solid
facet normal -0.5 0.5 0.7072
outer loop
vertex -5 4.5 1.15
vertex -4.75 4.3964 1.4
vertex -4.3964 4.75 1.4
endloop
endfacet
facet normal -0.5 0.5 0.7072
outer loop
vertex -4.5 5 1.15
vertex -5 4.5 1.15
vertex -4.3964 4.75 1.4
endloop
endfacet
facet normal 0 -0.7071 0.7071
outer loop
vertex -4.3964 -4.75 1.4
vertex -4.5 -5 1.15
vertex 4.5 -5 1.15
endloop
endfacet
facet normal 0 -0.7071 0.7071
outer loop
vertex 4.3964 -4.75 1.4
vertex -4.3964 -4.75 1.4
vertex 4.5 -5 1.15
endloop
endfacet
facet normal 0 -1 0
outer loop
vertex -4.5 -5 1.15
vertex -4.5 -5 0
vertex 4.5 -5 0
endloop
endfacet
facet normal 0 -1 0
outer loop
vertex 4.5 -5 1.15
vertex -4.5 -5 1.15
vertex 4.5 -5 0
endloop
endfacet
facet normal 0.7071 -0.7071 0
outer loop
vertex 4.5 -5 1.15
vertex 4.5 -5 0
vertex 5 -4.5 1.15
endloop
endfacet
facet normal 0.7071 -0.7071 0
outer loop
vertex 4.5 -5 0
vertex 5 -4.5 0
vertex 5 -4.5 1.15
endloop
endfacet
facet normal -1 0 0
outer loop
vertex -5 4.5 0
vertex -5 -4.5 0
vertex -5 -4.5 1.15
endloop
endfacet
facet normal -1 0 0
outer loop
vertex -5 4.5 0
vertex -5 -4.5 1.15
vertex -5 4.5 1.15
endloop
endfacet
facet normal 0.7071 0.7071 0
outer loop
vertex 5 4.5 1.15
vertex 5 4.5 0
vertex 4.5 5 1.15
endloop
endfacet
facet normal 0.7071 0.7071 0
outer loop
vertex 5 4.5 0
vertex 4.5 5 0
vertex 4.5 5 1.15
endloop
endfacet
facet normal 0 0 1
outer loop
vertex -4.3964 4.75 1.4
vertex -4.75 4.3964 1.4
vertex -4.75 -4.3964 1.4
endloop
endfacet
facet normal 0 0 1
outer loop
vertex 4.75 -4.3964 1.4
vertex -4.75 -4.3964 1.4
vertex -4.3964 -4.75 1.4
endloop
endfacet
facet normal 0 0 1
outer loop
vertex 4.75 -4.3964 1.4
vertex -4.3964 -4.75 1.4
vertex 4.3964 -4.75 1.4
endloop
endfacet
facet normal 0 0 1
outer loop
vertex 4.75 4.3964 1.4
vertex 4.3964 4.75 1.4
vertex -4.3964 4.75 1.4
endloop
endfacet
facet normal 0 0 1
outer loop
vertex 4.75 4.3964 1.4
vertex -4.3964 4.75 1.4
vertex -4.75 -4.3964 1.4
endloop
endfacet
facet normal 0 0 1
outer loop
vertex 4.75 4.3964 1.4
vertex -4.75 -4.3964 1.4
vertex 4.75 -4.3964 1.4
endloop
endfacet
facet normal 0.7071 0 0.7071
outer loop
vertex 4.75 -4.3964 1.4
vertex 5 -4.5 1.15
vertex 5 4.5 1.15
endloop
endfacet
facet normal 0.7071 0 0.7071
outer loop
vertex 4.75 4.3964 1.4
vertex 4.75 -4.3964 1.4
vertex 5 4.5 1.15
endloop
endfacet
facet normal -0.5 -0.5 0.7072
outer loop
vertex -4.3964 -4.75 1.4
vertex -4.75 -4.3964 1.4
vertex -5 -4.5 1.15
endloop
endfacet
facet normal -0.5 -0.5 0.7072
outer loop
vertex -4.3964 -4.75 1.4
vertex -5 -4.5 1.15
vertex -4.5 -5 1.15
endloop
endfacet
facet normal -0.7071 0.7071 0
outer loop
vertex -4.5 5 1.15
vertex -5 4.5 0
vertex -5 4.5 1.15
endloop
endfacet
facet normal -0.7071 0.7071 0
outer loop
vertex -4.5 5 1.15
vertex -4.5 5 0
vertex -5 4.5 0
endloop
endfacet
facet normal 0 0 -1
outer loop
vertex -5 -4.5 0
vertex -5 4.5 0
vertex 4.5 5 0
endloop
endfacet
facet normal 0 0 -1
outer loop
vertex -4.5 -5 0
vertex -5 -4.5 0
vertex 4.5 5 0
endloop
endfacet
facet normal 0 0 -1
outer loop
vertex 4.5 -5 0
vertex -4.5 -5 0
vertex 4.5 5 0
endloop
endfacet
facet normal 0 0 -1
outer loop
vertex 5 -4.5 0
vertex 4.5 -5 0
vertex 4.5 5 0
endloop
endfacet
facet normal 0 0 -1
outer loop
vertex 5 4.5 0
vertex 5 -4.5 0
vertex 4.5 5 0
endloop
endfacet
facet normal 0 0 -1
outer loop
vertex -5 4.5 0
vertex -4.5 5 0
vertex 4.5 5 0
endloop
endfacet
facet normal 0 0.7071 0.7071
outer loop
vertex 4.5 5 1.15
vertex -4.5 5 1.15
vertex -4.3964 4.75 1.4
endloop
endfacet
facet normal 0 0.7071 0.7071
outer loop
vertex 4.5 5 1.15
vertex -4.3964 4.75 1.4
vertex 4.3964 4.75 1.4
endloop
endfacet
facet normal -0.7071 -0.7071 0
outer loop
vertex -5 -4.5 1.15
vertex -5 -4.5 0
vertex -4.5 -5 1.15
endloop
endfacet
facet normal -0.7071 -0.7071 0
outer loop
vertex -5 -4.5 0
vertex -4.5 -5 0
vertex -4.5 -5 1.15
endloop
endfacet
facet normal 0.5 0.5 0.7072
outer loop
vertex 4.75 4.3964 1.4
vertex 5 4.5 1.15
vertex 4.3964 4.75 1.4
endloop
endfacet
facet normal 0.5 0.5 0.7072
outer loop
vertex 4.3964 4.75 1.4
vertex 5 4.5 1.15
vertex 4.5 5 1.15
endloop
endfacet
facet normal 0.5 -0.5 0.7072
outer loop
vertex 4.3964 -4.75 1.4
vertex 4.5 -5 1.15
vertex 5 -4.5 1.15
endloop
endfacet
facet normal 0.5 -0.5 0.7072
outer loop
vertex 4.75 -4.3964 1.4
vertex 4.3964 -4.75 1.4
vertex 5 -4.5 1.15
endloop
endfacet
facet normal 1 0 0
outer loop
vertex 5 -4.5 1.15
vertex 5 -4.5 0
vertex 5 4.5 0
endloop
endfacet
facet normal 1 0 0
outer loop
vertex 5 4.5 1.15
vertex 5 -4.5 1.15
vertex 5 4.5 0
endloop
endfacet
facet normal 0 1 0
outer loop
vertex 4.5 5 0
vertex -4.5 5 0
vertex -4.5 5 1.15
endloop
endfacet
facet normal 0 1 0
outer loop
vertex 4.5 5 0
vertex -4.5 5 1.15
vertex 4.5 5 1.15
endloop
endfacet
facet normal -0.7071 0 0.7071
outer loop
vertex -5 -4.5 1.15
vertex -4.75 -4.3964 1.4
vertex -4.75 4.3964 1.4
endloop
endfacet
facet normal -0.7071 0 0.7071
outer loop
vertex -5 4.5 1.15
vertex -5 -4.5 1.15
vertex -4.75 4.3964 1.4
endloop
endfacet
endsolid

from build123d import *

# Parameters (mm, degrees)
F0_W     = 10
F0_H     = 10
F1_DEPTH = 1.4
F2_SIZE  = 0.5
F3_SIZE  = 0.25


with BuildPart() as f1:
    # F0 (on Top) → F1 (new body)
    with BuildSketch(Plane.XY):
        Rectangle(F0_W, F0_H)
    extrude(amount=F1_DEPTH)

    # F2
    f2_edges = [f1.edges().sort_by_distance(p)[0] for p in [
        (5, 5, 0.7),
        (-5, 5, 0.7),
        (5, -5, 0.7),
        (-5, -5, 0.7),
    ]]
    chamfer(f2_edges, length=F2_SIZE)

    # F3
    f3_edges = [f1.edges().sort_by_distance(p)[0] for p in [
        (0, 5, 1.4),
        (-5, 0, 1.4),
        (-4.75, 4.75, 1.4),
        (0, -5, 1.4),
        (-4.75, -4.75, 1.4),
        (4.75, -4.75, 1.4),
        (5, 0, 1.4),
        (4.75, 4.75, 1.4),
    ]]
    chamfer(f3_edges, length=F3_SIZE)


solid = f1.part
